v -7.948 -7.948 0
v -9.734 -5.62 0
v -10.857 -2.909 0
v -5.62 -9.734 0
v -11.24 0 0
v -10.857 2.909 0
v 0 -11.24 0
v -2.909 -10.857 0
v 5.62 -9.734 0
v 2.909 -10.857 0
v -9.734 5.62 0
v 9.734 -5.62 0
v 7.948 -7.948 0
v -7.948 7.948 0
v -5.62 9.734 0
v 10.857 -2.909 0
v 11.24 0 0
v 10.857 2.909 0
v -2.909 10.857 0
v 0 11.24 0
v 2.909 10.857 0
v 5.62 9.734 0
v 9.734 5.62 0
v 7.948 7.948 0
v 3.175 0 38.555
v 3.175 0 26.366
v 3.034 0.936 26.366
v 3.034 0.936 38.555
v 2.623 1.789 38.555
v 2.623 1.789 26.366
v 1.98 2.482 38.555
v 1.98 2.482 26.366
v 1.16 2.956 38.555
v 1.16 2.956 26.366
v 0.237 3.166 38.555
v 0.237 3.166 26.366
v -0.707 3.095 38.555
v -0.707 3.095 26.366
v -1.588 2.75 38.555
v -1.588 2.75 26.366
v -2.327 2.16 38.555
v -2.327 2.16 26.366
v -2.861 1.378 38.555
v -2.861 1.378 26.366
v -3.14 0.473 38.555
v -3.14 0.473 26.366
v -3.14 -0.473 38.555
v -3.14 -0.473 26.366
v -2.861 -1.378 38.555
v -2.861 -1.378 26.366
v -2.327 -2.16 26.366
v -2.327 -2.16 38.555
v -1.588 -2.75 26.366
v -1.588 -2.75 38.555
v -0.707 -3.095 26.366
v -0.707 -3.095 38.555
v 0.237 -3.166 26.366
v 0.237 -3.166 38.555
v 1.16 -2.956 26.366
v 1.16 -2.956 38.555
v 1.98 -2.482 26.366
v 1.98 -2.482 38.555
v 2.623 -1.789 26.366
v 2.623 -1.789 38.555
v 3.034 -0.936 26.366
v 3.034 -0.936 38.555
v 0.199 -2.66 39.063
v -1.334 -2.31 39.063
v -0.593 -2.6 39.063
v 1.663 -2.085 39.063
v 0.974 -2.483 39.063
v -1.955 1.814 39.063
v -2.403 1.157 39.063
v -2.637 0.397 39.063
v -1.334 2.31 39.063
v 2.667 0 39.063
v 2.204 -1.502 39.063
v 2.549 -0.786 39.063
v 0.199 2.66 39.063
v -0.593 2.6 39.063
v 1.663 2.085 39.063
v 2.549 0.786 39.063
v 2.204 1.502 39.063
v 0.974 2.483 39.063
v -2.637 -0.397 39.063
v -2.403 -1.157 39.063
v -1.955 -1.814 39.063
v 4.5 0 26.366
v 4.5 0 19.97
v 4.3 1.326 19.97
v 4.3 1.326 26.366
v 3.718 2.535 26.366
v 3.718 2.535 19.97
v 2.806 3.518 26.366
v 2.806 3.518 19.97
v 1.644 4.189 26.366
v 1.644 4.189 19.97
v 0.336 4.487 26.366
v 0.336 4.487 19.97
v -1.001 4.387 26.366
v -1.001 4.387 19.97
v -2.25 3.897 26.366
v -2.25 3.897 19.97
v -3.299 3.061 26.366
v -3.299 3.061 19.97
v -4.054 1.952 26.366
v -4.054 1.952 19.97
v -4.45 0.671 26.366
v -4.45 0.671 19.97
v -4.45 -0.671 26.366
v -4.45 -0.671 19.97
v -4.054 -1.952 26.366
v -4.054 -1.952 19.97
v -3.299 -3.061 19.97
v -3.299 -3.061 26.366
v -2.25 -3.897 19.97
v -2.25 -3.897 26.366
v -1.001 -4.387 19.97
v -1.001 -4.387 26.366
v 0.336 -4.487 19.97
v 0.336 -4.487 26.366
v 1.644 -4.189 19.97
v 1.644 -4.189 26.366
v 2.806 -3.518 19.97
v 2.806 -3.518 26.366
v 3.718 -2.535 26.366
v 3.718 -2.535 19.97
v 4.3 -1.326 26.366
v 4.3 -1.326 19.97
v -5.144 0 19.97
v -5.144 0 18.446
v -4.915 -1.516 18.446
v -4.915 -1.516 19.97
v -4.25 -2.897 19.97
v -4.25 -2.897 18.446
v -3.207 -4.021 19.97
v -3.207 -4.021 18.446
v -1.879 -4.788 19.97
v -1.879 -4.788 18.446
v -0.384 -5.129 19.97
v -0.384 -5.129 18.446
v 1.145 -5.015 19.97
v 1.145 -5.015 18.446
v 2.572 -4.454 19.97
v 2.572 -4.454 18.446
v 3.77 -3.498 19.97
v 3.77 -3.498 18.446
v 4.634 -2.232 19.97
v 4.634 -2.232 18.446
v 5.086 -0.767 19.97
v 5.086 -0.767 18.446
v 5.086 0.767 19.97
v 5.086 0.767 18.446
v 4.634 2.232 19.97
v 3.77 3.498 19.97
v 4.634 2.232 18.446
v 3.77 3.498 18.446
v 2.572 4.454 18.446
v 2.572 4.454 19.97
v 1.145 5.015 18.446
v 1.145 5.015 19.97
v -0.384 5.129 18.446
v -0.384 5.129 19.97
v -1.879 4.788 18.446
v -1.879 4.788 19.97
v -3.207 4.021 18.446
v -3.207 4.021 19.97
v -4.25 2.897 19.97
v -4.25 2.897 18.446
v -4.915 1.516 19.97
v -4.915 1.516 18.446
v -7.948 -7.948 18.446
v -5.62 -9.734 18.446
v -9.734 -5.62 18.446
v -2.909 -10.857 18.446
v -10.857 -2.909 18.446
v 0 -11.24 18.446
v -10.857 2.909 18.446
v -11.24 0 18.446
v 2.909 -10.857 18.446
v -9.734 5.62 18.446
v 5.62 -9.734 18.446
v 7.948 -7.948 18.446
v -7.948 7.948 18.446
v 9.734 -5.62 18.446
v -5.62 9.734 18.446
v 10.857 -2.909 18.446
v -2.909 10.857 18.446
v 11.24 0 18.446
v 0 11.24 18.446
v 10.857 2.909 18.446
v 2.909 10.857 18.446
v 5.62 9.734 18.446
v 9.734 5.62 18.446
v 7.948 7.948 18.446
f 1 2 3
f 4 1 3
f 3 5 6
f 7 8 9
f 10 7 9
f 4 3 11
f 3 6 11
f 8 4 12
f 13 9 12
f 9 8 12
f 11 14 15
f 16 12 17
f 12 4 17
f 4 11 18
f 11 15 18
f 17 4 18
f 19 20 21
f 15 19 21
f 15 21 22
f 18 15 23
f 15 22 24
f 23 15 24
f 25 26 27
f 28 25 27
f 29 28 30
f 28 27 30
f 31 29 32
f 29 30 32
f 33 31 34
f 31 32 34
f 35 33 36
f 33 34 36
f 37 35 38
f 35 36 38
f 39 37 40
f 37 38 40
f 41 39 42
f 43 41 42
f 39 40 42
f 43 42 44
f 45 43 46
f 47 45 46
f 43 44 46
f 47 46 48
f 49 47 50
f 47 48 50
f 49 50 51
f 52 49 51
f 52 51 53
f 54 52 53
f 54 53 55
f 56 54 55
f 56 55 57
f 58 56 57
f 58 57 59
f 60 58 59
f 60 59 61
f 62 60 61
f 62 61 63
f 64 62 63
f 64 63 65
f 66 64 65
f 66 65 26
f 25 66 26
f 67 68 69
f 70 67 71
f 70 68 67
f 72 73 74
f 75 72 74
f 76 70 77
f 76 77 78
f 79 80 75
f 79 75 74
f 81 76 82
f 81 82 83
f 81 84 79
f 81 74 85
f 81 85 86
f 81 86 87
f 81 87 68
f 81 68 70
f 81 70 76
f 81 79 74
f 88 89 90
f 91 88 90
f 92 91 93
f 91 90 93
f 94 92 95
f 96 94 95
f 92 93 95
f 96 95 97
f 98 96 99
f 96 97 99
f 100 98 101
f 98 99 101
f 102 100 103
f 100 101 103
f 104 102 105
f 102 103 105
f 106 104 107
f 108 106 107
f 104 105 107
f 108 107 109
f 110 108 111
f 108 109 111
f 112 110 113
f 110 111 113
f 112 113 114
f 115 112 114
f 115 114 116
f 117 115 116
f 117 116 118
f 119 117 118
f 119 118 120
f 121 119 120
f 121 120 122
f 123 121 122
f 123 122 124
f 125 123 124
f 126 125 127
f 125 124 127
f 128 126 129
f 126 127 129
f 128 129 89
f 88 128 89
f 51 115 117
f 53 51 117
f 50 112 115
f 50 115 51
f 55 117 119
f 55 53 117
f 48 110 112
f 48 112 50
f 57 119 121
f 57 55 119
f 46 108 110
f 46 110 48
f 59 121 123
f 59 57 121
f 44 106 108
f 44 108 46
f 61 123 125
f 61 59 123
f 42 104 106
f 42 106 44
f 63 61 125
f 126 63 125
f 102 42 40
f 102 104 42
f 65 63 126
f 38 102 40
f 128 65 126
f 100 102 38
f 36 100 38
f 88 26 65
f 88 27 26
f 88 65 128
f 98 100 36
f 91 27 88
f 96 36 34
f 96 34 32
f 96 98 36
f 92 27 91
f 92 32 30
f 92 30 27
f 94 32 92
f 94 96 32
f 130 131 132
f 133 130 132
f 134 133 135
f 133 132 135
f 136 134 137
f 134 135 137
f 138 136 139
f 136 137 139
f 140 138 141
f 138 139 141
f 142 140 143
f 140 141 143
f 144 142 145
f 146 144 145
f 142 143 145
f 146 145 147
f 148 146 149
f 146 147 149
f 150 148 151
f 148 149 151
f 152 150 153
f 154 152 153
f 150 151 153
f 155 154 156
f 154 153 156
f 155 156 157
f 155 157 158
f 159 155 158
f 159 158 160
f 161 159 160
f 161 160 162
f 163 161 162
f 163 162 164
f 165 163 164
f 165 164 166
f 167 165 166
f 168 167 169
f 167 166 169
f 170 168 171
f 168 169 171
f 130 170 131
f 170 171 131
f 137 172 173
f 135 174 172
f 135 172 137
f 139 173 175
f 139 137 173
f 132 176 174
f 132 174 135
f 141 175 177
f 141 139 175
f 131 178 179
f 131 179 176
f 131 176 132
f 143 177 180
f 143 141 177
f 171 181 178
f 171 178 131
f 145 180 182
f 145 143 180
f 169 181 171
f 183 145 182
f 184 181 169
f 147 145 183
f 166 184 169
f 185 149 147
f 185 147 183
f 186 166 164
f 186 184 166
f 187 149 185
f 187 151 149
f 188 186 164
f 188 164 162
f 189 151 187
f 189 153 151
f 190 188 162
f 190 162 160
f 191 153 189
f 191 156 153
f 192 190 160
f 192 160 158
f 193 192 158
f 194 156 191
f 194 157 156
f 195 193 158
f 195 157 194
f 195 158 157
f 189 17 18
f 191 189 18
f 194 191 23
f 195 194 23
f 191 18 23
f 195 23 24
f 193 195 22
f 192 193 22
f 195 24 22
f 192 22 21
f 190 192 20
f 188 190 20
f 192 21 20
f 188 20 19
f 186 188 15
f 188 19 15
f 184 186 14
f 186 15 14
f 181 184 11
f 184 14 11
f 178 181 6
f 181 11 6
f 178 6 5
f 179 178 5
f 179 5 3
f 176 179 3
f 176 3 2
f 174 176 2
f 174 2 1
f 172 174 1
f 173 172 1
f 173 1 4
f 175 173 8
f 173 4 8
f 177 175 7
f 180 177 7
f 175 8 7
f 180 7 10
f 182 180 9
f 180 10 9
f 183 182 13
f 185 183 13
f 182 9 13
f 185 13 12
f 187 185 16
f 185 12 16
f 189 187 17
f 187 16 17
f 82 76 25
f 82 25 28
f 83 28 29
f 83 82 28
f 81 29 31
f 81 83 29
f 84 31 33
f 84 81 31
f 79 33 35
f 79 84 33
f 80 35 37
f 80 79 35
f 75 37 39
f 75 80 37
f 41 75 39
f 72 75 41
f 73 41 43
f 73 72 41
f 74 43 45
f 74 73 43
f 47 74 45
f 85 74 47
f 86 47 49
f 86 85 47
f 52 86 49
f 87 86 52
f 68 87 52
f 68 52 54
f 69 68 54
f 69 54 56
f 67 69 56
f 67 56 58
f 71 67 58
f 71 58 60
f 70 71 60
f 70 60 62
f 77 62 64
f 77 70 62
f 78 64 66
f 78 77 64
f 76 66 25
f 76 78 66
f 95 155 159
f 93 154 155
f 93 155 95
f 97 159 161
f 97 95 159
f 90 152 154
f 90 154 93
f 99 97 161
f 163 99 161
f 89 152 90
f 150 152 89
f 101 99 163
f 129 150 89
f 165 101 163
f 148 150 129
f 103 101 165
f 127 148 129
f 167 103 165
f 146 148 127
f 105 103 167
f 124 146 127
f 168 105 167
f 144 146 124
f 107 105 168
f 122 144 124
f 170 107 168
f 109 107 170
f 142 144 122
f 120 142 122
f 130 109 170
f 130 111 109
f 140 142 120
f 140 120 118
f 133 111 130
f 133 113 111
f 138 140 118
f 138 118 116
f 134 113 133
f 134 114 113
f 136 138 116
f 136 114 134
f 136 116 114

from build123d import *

# Parameters (mm, degrees)
SKETCH1_R       = 11.2395
BODY_DEPTH      = 18.446
SKETCH2_R       = 5.1435
LIP_DEPTH       = 1.524
SKETCH3_R       = 4.5
THREADING_DEPTH = 6.396
SKETCH4_R       = 3.175
SHAFT_DEPTH     = 20.617
CHAMFER1_SIZE   = 0.508


with BuildPart() as part:
    # Sketch1 → Body (new body)
    with BuildSketch(Plane.XY):
        Circle(SKETCH1_R)
    extrude(amount=BODY_DEPTH)

    # Sketch2 → Lip (add)
    with BuildSketch(Plane.XY.offset(18.446)):
        with Locations(Location((0, 0, 0), (0, 0, 180))):
            Circle(SKETCH2_R)
    extrude(amount=LIP_DEPTH)

    # Sketch3 → Threading (add)
    with BuildSketch(Plane.XY.offset(19.97)):
        Circle(SKETCH3_R)
    extrude(amount=THREADING_DEPTH)

    # Sketch4 → Shaft (add)
    with BuildSketch(Plane.XY.offset(18.446)):
        Circle(SKETCH4_R)
    extrude(amount=SHAFT_DEPTH)

    # Chamfer1
    chamfer1_edges = [part.edges().sort_by_distance(p)[0] for p in [
        (-3.175, 0, 39.063),
    ]]
    chamfer(chamfer1_edges, length=CHAMFER1_SIZE)


solid = part.part
